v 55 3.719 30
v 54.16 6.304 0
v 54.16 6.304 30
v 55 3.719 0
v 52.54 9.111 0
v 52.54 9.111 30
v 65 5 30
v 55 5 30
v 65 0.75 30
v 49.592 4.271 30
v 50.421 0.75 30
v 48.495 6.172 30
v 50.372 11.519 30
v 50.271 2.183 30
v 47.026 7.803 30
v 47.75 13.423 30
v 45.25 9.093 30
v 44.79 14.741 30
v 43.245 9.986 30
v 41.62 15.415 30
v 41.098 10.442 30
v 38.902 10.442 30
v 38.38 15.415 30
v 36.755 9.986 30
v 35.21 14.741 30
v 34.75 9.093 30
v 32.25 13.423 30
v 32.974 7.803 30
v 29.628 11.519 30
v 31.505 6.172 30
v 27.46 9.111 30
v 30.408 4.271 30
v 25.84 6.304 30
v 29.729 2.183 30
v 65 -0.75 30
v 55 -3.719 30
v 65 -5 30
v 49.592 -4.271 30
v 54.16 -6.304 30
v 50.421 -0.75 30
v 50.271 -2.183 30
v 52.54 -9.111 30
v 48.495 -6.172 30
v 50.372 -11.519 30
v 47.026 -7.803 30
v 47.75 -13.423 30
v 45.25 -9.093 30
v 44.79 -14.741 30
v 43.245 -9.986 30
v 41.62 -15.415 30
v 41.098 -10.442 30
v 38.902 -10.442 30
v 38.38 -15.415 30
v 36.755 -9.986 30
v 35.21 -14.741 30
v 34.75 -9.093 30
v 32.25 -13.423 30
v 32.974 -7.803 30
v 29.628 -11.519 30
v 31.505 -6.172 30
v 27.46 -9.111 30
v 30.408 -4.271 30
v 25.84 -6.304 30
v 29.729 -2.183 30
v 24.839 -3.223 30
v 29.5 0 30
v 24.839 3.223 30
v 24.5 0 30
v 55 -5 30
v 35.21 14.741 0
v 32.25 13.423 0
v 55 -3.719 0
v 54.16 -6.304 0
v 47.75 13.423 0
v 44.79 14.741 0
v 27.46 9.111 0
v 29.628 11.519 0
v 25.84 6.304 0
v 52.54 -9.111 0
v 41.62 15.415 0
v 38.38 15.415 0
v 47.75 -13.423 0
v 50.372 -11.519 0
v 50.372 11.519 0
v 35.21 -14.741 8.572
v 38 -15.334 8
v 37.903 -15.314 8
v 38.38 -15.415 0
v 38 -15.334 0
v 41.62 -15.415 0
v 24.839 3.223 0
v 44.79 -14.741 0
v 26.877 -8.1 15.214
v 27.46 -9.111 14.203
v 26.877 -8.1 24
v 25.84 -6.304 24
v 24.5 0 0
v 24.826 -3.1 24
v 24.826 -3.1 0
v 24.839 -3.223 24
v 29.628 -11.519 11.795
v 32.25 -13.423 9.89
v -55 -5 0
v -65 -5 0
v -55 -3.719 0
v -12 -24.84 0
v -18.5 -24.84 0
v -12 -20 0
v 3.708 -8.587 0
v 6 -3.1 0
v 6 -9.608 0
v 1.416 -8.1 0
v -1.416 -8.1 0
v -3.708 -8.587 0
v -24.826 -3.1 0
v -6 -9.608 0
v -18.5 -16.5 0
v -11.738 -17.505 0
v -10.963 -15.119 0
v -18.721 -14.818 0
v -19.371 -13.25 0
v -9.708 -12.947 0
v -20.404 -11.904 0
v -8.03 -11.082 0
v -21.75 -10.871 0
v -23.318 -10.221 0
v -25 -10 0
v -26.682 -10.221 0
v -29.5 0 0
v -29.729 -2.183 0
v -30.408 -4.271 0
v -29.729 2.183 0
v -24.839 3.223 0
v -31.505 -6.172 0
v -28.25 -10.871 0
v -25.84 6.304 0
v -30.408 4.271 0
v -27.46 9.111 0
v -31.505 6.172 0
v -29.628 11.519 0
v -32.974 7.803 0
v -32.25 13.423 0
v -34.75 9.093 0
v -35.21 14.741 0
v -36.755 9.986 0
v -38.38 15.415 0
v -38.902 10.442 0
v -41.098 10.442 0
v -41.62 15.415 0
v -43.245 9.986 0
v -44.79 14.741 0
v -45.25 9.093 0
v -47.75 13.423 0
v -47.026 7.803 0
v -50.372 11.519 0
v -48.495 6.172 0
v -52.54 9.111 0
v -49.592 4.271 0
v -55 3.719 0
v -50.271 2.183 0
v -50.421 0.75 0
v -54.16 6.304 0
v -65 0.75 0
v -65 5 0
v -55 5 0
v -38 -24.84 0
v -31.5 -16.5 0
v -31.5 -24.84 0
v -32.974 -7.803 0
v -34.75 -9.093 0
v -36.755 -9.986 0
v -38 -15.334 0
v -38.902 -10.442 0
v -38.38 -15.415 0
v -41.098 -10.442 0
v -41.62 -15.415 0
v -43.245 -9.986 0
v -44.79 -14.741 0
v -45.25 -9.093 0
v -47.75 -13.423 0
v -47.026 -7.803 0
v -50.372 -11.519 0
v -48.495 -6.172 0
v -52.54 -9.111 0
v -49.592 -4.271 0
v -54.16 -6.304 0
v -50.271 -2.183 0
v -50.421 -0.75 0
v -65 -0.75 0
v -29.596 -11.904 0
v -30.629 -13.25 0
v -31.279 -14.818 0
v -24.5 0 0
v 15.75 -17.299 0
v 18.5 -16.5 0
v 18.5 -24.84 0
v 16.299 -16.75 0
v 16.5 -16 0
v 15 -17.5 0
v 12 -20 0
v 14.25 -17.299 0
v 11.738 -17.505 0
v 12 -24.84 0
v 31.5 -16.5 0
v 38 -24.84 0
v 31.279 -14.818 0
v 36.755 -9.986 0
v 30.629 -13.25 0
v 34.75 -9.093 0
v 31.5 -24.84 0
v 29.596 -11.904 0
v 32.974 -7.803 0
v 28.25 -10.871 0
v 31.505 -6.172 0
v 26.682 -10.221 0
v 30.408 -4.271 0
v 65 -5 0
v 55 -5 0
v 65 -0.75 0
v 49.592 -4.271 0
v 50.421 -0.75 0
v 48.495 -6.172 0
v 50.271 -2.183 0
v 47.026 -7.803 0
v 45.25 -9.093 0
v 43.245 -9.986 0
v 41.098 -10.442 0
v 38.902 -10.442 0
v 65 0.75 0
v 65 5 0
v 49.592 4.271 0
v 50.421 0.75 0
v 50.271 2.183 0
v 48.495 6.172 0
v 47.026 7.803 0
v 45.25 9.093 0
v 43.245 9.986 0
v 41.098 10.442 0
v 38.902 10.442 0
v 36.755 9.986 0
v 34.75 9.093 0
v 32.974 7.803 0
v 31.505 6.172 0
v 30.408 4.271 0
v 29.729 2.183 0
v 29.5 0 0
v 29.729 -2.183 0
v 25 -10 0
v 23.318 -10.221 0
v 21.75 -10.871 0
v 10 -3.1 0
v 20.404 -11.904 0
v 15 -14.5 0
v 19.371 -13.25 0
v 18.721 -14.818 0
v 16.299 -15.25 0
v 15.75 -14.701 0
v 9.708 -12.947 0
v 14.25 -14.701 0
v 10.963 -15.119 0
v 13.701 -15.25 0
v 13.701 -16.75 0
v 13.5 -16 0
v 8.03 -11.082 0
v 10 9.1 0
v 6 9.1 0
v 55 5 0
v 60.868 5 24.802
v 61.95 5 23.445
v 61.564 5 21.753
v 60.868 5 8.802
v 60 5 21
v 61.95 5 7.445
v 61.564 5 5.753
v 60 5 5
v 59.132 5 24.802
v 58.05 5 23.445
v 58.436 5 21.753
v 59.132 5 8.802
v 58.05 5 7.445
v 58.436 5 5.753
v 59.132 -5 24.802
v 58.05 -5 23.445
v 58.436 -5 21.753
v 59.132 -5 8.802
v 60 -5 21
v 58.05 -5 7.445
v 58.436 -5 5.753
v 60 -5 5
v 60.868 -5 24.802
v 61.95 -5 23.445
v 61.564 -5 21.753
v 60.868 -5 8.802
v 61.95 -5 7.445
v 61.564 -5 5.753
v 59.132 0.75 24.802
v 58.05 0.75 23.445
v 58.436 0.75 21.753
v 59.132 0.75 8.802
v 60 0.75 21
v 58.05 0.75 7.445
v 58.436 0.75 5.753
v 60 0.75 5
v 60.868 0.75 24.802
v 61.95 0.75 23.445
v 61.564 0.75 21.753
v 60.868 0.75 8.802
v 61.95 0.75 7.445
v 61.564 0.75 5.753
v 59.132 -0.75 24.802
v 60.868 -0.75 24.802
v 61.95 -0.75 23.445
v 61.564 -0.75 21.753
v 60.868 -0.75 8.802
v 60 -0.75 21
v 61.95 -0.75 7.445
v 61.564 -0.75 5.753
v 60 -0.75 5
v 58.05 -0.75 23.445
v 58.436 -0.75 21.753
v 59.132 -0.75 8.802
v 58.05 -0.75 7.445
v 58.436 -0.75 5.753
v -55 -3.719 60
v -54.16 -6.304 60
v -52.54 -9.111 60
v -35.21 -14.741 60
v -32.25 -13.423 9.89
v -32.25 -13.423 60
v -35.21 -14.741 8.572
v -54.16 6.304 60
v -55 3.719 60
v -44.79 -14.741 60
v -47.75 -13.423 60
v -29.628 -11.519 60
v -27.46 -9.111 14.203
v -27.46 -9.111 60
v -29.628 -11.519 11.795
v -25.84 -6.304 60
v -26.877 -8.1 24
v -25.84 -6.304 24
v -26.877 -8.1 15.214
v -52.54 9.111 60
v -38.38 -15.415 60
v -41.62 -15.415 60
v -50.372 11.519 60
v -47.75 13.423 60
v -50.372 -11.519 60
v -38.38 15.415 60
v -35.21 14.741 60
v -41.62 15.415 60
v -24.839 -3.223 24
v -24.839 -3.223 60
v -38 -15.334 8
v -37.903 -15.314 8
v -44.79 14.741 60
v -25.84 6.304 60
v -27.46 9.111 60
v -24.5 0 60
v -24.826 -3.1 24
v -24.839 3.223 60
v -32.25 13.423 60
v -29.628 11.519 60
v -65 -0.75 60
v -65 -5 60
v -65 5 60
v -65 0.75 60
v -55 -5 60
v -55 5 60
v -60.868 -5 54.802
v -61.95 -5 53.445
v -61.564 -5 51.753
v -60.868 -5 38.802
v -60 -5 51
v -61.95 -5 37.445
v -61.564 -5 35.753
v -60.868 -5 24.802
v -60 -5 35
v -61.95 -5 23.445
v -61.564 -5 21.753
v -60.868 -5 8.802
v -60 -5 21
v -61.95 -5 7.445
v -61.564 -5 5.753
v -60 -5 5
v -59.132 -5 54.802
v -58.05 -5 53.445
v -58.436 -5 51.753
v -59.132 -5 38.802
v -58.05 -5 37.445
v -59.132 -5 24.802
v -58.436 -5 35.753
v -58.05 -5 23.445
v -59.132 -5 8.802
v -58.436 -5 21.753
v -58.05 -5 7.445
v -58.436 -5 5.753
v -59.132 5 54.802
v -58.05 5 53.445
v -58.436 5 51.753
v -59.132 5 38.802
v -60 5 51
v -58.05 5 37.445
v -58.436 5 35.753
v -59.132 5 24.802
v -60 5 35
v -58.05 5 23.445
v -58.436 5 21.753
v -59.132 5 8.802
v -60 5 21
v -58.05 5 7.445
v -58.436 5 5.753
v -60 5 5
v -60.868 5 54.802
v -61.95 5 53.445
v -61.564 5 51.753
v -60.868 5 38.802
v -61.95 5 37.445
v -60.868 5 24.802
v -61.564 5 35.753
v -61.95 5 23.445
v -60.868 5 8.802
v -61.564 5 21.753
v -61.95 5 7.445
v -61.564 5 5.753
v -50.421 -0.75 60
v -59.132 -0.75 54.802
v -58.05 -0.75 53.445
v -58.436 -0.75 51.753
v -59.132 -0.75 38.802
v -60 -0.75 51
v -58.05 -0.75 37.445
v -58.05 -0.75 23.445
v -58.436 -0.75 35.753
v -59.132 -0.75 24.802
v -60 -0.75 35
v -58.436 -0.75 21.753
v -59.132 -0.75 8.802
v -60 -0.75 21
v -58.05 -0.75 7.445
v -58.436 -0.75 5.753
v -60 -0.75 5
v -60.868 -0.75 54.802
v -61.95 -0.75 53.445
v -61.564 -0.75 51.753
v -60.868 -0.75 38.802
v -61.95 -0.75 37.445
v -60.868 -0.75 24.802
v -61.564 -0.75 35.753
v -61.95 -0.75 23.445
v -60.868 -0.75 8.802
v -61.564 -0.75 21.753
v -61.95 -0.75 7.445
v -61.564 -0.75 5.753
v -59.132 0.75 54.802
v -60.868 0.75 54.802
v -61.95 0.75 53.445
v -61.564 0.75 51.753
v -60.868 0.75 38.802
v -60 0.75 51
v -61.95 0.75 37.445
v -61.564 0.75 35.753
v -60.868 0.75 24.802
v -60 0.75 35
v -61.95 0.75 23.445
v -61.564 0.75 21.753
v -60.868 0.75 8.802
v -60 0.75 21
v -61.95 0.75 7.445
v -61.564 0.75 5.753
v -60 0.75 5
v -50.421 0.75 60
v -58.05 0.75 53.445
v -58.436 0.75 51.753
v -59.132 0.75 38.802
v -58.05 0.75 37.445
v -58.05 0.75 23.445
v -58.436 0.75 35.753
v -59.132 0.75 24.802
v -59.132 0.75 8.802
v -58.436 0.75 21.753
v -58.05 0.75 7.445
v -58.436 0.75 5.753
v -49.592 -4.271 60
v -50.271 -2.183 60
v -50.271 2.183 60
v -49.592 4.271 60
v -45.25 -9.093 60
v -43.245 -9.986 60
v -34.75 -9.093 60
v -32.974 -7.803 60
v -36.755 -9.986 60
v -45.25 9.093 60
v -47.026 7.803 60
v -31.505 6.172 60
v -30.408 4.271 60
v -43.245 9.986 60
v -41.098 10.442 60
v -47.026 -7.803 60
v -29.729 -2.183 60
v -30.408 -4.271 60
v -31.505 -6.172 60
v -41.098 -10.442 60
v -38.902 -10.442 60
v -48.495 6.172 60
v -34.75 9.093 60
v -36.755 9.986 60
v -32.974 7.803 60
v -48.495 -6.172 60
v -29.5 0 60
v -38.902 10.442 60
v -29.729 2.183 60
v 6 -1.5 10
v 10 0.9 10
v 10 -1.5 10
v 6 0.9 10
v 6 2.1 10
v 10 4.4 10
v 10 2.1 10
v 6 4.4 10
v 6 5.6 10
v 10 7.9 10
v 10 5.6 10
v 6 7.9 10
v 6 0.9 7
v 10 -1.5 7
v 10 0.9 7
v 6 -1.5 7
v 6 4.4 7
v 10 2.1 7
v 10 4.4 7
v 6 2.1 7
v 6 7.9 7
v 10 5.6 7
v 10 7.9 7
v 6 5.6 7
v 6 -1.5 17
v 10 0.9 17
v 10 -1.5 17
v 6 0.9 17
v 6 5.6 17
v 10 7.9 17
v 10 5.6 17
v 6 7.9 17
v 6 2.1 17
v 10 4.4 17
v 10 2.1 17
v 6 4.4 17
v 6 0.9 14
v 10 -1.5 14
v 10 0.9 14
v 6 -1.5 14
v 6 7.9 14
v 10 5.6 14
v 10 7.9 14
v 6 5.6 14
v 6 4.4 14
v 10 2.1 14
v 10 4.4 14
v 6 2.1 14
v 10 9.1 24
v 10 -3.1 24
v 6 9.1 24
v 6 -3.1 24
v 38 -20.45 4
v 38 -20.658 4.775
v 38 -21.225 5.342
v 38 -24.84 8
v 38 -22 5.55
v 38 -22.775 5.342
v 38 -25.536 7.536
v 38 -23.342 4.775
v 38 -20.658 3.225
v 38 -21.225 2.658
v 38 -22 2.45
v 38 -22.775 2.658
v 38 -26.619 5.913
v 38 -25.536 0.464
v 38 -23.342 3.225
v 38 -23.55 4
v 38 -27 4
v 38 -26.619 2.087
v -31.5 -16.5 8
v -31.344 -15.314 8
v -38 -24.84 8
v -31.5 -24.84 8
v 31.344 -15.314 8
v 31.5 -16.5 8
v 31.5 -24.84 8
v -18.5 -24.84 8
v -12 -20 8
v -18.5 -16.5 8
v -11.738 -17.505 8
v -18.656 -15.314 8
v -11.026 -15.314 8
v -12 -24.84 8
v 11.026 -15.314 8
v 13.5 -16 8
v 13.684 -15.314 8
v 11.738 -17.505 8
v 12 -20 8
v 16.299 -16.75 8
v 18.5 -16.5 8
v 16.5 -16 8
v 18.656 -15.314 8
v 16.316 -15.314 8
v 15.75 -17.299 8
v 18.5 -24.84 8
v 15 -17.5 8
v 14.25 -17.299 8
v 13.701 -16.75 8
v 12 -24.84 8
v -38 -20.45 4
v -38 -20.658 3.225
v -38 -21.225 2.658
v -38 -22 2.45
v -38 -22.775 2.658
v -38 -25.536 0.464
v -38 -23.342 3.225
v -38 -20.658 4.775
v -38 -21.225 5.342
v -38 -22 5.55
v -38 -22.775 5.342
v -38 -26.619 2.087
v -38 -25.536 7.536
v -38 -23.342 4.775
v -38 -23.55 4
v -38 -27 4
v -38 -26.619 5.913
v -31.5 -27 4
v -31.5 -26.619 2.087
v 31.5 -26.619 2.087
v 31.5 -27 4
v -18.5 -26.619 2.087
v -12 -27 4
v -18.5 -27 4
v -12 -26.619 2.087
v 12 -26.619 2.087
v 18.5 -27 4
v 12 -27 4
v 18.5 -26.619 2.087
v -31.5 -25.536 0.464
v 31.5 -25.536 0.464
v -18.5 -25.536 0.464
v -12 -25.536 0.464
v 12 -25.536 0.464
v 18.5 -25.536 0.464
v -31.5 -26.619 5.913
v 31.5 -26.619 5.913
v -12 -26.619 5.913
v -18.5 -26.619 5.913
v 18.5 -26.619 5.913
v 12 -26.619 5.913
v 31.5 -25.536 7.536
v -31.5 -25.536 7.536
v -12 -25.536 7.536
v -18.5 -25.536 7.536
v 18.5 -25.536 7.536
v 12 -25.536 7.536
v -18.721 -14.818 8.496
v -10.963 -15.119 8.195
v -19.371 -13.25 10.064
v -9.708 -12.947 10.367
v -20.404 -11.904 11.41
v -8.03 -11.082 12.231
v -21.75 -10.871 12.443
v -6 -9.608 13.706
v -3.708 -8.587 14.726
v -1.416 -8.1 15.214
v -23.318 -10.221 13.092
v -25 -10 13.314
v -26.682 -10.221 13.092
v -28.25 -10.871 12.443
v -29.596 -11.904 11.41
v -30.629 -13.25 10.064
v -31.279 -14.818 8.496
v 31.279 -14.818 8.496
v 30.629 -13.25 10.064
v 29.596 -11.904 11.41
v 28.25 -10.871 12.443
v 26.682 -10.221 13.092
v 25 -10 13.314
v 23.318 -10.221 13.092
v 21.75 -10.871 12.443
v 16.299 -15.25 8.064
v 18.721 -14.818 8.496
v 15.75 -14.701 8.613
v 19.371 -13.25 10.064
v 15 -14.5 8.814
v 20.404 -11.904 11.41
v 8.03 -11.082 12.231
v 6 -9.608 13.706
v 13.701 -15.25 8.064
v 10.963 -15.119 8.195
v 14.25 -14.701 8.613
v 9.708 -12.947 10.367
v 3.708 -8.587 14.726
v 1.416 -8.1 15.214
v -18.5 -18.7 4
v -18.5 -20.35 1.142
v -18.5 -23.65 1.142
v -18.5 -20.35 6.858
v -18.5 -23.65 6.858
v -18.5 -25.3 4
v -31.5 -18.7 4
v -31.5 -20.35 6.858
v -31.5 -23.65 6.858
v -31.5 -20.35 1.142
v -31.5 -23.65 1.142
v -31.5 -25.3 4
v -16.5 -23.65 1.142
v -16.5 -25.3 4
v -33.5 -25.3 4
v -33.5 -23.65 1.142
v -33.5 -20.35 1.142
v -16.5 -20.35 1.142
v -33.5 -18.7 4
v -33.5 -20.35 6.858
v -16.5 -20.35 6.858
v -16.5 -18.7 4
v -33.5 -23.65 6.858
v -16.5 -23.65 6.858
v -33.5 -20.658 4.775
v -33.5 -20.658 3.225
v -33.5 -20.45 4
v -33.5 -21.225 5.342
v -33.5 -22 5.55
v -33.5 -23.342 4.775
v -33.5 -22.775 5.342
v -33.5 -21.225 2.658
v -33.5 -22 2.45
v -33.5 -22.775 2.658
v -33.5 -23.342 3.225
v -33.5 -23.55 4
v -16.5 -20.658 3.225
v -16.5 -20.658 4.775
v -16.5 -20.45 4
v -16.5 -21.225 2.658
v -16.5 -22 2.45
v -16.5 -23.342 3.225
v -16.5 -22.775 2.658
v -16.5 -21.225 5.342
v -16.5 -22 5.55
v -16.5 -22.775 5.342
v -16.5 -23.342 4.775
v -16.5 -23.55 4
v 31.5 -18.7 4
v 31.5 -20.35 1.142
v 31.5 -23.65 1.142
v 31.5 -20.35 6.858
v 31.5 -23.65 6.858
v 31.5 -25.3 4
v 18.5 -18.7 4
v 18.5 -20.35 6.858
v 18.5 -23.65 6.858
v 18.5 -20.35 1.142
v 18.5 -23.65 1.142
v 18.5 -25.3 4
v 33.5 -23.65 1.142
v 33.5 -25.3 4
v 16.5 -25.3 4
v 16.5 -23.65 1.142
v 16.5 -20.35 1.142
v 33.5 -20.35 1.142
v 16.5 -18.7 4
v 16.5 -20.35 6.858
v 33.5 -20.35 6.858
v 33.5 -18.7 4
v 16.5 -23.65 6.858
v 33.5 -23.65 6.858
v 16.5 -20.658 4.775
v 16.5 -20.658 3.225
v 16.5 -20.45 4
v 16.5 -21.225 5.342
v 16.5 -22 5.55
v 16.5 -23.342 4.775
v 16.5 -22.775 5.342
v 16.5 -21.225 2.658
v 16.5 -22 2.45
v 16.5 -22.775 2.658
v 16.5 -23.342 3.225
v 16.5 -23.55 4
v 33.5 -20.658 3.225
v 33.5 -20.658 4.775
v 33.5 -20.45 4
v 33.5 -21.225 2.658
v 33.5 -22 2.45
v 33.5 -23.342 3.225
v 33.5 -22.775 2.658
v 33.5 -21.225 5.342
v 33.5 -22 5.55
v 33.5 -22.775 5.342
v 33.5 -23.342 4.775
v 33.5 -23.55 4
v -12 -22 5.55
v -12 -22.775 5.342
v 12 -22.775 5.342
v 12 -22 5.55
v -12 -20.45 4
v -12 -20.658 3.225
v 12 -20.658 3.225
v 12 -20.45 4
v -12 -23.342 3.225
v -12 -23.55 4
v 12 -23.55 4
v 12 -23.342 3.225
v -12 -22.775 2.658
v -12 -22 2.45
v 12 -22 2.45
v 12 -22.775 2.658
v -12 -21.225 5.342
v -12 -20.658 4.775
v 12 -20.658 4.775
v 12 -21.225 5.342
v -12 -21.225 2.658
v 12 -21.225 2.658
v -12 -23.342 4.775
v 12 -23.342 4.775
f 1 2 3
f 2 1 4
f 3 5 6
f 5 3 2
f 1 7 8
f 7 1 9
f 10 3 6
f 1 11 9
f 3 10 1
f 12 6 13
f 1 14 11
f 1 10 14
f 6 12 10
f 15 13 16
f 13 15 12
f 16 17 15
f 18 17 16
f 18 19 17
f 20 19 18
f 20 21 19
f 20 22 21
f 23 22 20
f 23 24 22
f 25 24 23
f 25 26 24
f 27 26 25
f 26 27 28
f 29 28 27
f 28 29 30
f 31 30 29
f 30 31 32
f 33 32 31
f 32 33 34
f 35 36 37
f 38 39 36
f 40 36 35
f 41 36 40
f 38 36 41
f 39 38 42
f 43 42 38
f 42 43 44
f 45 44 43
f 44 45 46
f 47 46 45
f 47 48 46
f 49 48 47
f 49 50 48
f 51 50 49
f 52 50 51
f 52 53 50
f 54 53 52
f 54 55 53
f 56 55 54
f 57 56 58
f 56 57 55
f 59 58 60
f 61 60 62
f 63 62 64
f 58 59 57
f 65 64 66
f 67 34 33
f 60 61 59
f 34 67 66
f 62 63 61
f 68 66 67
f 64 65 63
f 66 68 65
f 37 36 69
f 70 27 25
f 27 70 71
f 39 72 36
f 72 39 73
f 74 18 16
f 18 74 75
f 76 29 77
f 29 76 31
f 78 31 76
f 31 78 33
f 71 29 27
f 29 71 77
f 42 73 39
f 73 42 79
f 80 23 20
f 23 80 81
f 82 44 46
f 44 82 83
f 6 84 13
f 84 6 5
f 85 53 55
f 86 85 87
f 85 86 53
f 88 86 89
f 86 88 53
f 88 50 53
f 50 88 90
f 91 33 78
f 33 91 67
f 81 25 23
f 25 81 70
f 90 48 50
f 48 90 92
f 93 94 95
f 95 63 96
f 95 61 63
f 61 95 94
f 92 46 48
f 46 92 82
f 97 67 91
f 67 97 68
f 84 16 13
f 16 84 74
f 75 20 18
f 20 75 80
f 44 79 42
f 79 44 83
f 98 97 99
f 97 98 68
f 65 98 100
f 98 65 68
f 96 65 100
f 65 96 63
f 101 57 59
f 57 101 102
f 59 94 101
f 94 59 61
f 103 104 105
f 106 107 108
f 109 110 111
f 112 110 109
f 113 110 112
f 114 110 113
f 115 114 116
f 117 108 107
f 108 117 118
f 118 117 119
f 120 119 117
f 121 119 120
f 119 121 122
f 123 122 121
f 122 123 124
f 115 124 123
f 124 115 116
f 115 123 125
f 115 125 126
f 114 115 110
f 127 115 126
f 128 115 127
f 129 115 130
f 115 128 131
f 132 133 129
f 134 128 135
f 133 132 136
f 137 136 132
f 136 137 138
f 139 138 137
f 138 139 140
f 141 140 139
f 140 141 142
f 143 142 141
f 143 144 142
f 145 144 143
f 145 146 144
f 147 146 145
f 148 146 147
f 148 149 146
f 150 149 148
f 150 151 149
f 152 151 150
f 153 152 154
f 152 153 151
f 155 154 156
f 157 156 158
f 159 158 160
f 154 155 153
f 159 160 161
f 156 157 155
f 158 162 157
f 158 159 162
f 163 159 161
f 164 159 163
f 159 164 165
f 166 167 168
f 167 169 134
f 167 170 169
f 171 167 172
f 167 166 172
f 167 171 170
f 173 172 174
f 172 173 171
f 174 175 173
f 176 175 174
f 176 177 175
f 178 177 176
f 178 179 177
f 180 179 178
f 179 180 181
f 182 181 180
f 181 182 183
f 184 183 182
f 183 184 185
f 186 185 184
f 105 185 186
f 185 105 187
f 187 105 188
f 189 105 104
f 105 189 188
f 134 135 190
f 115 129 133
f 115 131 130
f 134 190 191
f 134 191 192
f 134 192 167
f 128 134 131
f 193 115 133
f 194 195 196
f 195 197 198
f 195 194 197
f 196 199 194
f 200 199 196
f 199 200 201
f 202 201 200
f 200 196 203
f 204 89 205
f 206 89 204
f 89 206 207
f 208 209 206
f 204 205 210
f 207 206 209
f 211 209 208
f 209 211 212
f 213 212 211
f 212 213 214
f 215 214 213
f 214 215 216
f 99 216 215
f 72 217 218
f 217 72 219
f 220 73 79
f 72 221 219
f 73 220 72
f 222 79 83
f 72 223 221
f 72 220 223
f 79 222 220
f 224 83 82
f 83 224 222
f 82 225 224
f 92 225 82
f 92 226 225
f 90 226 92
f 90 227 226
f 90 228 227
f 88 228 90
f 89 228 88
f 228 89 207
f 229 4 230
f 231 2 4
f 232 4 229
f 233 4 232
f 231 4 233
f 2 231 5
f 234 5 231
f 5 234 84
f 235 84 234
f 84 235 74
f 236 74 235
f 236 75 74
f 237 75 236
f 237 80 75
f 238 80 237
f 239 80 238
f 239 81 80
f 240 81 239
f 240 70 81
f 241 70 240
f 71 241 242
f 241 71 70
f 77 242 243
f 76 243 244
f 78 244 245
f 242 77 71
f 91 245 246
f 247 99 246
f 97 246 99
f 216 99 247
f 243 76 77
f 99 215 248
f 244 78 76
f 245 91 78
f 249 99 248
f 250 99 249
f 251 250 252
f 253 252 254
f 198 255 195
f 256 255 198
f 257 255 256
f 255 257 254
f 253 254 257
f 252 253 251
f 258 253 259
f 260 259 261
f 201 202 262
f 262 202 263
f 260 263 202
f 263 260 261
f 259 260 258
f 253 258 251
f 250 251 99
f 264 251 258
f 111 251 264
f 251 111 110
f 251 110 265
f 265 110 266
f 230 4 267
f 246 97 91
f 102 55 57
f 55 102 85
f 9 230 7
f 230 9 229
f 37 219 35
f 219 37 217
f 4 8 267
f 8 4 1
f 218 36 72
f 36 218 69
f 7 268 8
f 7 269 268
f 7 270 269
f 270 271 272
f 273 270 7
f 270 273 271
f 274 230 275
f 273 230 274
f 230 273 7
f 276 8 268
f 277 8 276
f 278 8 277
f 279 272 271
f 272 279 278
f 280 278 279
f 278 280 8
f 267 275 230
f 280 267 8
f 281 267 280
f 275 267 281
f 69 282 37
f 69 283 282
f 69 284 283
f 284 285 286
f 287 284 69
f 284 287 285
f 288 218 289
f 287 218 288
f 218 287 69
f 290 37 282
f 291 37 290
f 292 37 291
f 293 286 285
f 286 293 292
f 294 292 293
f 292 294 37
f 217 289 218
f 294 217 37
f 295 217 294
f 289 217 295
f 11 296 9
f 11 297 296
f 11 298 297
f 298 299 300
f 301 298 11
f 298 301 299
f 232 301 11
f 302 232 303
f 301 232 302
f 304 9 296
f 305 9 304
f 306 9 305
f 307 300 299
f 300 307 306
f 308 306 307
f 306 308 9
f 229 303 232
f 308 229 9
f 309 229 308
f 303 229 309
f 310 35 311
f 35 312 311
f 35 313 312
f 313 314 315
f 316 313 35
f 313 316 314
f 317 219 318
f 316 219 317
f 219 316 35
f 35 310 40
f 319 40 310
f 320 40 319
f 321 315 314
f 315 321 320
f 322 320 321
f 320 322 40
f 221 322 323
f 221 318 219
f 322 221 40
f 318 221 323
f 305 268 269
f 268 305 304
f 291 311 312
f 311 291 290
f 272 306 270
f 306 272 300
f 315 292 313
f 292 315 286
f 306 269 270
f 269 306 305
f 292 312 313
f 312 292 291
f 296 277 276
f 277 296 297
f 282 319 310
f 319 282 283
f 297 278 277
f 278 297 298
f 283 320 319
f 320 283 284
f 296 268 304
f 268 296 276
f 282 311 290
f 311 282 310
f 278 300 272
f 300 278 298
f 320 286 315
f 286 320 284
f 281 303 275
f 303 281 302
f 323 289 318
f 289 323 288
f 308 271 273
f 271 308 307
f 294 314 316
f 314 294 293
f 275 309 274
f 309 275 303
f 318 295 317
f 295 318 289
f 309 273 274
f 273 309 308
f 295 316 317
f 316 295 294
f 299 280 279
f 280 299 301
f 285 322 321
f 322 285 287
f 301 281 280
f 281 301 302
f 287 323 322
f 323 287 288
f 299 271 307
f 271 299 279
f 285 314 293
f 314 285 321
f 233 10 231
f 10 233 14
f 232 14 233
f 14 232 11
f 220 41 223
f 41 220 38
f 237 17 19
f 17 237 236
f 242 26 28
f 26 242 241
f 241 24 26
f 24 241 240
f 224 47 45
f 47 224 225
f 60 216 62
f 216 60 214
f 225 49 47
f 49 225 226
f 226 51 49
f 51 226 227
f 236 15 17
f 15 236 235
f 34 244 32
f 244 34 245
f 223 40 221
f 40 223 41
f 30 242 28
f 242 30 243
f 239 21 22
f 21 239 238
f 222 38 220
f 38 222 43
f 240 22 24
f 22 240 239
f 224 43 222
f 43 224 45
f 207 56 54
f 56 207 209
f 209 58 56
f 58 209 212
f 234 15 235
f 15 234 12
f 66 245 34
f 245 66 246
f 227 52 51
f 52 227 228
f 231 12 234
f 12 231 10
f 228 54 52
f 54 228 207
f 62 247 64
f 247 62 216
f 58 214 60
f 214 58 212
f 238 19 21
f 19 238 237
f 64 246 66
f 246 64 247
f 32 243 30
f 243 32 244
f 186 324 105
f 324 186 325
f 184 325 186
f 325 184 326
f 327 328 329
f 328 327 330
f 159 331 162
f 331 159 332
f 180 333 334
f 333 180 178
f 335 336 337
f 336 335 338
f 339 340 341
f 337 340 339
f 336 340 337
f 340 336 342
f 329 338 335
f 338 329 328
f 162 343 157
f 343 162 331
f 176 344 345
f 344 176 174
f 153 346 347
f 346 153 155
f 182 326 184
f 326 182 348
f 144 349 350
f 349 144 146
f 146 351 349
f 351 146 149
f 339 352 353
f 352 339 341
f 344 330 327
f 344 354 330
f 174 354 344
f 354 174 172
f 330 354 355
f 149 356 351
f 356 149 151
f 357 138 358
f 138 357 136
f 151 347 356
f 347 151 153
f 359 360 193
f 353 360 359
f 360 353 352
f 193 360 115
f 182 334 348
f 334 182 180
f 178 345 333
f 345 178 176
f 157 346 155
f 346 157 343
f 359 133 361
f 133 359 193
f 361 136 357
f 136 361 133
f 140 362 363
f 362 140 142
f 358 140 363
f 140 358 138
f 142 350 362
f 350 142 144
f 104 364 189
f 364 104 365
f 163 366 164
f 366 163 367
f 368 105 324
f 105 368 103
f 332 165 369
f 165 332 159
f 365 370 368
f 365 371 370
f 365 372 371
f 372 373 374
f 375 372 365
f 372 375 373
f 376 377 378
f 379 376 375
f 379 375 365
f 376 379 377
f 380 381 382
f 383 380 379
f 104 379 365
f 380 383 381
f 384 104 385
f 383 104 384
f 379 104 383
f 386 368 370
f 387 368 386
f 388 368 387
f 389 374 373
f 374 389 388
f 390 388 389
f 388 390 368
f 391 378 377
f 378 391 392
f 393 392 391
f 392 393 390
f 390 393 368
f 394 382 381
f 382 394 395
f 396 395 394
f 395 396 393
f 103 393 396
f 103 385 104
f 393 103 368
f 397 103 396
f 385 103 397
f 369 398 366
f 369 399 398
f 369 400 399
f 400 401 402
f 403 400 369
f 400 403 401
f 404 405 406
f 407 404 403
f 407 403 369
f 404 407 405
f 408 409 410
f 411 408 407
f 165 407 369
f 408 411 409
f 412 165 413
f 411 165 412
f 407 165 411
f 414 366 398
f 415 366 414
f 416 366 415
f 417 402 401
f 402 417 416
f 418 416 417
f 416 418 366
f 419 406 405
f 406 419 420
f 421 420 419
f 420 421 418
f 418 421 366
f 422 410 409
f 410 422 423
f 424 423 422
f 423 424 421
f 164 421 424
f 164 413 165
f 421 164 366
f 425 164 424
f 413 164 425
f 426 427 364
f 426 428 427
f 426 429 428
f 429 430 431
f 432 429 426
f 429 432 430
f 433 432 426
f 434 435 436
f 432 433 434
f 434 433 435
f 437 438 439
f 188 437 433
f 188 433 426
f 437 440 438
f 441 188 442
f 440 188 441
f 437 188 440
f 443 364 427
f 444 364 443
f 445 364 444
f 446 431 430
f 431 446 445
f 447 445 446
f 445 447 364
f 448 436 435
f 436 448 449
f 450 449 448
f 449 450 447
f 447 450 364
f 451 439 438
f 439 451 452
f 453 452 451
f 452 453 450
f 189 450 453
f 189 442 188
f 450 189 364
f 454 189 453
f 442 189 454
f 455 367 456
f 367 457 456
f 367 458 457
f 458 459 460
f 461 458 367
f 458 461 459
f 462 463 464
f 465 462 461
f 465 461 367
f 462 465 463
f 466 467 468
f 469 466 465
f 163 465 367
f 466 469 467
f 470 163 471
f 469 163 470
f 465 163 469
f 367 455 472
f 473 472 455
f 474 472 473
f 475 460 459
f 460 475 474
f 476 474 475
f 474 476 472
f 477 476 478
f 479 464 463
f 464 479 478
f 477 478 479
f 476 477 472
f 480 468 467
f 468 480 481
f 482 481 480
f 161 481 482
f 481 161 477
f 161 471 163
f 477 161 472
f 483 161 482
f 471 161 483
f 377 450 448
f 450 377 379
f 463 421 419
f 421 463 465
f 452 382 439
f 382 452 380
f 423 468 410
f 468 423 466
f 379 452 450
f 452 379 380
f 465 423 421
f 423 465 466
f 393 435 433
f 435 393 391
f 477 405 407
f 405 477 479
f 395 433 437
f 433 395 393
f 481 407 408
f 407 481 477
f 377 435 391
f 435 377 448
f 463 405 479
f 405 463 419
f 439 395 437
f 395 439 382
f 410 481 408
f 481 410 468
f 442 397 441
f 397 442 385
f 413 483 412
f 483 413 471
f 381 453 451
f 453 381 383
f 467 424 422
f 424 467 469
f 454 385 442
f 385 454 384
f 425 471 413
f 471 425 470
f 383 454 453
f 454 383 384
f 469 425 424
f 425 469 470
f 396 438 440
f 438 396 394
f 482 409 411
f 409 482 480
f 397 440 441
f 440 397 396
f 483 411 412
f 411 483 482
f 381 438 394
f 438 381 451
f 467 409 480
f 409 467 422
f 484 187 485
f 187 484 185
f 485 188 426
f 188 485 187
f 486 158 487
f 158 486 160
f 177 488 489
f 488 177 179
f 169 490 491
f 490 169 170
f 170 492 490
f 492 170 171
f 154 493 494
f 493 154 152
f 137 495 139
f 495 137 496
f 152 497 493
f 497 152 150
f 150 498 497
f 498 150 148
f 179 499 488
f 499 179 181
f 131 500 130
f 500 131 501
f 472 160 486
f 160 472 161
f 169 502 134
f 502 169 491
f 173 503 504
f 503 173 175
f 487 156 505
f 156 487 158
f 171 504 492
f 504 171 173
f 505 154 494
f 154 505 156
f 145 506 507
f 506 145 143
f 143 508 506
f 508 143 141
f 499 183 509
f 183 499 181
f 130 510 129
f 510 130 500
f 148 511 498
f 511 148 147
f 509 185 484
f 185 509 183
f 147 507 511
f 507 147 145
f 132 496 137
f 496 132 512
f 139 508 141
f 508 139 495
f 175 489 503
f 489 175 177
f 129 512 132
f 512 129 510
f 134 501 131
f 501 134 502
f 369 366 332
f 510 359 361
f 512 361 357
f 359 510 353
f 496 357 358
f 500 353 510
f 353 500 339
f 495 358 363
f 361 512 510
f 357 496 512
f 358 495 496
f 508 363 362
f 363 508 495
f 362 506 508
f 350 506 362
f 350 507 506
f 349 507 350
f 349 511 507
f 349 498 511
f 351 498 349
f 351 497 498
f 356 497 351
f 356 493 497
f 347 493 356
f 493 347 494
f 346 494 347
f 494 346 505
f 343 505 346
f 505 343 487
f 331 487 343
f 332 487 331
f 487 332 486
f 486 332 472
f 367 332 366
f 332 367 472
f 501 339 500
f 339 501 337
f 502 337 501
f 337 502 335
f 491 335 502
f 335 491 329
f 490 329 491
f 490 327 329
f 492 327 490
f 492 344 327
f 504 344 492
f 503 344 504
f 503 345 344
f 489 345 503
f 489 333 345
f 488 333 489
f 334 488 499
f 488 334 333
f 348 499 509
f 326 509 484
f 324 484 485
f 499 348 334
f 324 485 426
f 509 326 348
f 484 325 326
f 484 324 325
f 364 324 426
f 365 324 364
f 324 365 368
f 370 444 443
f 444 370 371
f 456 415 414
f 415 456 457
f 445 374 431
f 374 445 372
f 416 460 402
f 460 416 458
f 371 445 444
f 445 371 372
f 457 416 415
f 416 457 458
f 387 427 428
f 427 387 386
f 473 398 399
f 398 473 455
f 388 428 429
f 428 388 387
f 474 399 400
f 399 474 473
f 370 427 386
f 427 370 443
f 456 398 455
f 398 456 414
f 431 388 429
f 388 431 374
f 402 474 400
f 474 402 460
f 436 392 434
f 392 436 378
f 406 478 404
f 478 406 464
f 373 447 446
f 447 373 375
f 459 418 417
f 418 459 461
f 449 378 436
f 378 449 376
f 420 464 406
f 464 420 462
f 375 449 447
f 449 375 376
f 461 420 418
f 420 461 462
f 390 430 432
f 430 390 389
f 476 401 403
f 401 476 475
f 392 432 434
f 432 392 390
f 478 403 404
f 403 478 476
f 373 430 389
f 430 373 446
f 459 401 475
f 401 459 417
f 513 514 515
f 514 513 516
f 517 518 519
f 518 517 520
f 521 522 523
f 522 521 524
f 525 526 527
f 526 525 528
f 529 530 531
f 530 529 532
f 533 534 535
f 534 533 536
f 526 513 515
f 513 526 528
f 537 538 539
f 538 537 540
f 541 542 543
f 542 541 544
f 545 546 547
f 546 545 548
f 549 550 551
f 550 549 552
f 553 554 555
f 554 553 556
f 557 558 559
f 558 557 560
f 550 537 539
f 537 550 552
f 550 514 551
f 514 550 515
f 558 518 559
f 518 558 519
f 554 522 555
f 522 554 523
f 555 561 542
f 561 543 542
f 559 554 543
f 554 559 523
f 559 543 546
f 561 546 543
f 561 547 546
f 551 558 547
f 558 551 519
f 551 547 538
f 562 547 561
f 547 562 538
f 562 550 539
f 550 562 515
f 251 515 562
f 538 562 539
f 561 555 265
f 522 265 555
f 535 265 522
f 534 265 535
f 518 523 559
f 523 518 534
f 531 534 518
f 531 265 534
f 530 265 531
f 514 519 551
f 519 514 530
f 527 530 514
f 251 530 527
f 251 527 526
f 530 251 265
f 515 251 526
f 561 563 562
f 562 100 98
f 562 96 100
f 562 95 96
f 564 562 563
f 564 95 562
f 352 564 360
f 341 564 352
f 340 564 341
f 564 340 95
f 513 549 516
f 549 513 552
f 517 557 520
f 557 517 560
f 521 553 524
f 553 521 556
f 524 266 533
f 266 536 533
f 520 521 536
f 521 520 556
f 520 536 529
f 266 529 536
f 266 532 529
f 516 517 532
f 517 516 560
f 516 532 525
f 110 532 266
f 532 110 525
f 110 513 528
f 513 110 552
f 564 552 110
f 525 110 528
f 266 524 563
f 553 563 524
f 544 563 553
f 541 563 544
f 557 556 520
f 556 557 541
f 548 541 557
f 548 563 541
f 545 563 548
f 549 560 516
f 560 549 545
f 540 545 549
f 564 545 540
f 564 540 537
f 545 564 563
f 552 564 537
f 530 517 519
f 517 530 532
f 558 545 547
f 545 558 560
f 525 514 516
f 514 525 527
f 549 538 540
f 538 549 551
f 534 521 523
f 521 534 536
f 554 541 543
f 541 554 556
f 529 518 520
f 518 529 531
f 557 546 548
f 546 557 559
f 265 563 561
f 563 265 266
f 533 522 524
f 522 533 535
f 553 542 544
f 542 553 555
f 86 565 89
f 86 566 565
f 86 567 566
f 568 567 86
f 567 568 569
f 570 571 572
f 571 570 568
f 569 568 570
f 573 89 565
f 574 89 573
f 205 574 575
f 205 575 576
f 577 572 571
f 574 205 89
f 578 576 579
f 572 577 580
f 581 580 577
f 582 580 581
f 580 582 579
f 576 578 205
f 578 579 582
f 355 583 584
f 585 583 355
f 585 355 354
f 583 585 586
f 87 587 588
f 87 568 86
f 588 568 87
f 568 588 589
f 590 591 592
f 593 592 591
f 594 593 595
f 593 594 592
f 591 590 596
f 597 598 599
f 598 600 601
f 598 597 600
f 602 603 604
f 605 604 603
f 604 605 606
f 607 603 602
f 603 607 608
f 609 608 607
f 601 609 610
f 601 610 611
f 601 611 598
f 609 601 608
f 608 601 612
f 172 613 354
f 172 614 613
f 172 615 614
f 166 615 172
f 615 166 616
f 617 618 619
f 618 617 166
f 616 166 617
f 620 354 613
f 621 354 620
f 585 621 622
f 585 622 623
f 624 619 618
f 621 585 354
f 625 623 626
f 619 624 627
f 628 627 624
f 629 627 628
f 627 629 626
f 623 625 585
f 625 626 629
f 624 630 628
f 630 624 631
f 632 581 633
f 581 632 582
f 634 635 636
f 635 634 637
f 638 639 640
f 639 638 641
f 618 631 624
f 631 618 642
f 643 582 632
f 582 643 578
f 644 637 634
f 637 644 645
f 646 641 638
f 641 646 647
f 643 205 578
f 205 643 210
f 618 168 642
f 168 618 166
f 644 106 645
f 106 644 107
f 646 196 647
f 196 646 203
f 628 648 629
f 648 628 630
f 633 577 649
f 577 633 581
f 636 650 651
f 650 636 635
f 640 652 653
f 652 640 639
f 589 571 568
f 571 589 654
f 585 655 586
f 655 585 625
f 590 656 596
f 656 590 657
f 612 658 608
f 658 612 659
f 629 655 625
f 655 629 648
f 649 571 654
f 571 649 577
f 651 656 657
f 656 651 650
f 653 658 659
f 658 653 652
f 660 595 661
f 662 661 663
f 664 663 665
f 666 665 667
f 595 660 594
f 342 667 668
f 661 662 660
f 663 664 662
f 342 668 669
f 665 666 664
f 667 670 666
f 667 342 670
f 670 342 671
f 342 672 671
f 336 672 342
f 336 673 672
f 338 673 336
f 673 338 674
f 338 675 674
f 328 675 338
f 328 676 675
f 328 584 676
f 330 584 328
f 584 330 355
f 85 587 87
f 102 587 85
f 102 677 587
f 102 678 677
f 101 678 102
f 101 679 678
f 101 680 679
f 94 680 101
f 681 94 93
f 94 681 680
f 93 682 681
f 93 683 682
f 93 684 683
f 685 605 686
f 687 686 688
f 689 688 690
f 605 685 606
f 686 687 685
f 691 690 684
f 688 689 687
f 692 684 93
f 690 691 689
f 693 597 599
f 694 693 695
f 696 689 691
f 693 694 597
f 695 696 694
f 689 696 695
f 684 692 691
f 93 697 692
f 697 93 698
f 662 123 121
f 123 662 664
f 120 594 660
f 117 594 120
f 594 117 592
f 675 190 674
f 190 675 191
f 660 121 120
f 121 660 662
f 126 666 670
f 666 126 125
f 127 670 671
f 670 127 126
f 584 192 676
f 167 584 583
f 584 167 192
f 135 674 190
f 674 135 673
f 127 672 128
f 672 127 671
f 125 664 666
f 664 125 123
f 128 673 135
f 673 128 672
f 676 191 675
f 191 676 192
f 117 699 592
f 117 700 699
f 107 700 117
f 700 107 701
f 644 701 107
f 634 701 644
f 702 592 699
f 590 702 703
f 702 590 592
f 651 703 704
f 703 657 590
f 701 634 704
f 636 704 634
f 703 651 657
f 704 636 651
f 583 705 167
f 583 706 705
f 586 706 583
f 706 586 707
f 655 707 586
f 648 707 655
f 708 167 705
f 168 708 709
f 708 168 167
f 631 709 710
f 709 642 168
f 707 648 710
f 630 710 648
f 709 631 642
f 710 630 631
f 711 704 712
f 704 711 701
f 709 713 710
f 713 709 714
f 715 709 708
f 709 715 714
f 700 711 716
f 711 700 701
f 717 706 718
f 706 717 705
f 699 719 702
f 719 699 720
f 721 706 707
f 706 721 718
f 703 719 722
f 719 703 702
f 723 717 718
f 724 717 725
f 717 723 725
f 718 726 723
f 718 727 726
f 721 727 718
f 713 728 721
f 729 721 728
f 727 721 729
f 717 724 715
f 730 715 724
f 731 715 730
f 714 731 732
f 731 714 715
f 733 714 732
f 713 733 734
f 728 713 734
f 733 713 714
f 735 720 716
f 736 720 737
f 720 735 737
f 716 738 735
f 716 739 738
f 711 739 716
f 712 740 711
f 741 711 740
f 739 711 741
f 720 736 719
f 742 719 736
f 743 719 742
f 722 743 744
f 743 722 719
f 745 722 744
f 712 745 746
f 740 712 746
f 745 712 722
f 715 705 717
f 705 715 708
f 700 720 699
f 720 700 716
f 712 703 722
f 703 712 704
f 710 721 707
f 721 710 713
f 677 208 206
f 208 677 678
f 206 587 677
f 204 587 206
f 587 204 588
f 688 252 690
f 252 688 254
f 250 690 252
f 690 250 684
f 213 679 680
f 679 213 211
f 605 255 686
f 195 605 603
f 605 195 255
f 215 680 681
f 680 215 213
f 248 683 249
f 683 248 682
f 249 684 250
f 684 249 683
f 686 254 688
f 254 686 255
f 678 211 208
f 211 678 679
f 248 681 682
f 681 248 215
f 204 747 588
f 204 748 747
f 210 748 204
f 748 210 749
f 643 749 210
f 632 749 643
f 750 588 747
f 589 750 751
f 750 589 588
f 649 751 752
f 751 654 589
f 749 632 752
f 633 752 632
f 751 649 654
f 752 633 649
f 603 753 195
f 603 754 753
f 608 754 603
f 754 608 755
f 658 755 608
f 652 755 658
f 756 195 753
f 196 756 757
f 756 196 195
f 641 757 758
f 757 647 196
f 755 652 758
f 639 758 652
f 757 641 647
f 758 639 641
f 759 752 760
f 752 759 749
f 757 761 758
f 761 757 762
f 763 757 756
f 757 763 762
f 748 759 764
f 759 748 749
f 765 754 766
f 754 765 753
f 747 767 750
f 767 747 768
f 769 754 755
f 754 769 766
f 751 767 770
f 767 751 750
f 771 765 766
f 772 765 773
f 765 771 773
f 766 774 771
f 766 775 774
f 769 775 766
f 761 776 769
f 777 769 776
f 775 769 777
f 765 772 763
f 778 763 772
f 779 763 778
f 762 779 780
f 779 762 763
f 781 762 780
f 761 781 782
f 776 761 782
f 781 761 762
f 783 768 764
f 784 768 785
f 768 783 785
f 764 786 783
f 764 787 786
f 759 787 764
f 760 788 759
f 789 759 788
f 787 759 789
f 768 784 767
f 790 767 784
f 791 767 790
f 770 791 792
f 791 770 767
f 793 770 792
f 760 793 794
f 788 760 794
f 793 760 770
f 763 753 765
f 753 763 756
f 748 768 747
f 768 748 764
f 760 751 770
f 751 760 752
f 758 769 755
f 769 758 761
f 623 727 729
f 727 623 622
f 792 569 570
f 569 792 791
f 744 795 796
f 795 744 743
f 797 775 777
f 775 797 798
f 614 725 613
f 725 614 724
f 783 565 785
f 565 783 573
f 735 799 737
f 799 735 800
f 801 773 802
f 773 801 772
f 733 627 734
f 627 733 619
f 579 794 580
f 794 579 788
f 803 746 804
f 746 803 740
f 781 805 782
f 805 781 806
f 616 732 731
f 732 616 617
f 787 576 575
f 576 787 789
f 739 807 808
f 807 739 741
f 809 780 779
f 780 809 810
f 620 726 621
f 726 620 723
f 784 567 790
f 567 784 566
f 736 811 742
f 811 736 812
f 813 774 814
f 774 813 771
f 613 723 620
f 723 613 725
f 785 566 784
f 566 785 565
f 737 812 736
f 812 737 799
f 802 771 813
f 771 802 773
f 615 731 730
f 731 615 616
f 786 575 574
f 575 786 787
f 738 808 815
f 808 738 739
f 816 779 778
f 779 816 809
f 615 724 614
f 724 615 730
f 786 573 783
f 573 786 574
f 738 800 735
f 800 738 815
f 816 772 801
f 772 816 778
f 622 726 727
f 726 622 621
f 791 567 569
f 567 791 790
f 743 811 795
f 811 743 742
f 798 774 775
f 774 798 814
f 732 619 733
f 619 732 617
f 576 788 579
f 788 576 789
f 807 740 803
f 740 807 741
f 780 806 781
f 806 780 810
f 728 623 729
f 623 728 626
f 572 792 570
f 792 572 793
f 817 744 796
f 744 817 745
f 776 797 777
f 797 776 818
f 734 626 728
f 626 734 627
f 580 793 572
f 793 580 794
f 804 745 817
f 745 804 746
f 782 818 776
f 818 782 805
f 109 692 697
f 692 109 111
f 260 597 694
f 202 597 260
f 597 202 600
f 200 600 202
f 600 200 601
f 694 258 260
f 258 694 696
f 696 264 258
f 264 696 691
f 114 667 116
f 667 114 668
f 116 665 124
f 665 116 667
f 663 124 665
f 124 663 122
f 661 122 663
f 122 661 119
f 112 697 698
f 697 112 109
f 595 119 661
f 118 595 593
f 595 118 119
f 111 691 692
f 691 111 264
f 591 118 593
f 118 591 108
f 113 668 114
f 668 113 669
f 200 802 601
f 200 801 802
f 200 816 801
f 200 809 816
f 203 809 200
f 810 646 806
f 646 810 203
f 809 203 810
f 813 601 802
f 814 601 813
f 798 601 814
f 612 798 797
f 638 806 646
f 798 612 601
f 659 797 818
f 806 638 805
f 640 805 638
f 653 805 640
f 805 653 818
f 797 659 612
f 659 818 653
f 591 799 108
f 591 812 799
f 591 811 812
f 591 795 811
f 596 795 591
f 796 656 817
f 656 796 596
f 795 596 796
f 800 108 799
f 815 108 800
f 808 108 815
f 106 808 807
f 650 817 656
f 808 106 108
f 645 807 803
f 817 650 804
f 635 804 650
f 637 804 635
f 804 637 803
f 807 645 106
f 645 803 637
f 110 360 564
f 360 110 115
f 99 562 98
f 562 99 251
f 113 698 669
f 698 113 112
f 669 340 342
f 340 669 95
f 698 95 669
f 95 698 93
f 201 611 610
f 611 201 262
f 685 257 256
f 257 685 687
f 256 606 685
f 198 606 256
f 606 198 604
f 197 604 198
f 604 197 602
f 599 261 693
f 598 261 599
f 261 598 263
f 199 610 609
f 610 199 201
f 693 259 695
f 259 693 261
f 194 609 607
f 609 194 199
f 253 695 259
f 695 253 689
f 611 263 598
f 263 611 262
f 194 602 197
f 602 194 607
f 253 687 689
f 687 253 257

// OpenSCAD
// file: configuration.scad
motor_end_height=50;
idler_end_height=28;
carriage_height=24;
platform_thickness=8;
bed_thickness=12;
pcb_thickness=2;
rod_length=200;
smooth_rod_length=1000;
smooth_rod_diameter=12;
smooth_rod_distance=80;
sandwich_smooth_rod_mounting_screw_distance=12;
tower_radius = 200;
platform_hinge_offset=33;
carriage_hinge_offset=22;
plywood_thickness=9;
// main file
include <configuration.scad>

width = 76;
height = carriage_height;

offset = 25;
cutout = 13;
middle = 2*offset - width/2;

module parallel_joints(reinforced) {
  difference() {
    union() {
      intersection() {
        cube([width, 20, 8], center=true);
        rotate([0, 90, 0]) cylinder(r=5, h=width, center=true);
      }
      intersection() {
        translate([0, 18, 4]) rotate([45, 0, 0])
          cube([width, reinforced, reinforced], center=true);
        translate([0, 0, 20]) cube([width, 35, 40], center=true);
      }
      translate([0, 8, 0]) cube([width, 16, 8], center=true);
    }
    rotate([0, 90, 0]) cylinder(r=1.55, h=80, center=true, $fn=12);

    for (x = [-offset, offset]) {
      translate([x, 5.5, 0])
        cylinder(r=cutout/2, h=100, center=true, $fn=24);
      translate([x, -4.5, 0])
        cube([cutout, 20, 100], center=true);
      translate([x, 0, 0]) rotate([0, 90, 0]) rotate([0, 0, 30])
        cylinder(r=3.3, h=17, center=true, $fn=6);
    }
    translate([0, 2, 0]) cylinder(r=middle, h=100, center=true);
    translate([0, -8, 0]) cube([2*middle, 20, 100], center=true);
  }
}

module lm8uu_mount(d, h) {
  union() {
    difference() {
      union() {
        cylinder(r=d/2+5, h=h, center=true);
        translate([20, 0, 0]) cube([10, 10, h], center=true);
      }
		translate([18,0,0])cube([22,1.5,h+2],center=true);
		translate([20,0,8])rotate([90,90,0])cylinder(r=2,h=40,center=true);
		translate([20,0,-8])rotate([90,90,0])cylinder(r=2,h=40,center=true);
      cylinder(r=d/2, h=h+1, center=true);
    }
  }
}

module belt_mount() {
  difference() {
    union() {
      difference() {
        translate([8, 2, 0]) cube([4, 13, height], center=true);
        for (z = [-3.5, 3.5])
          translate([8, 5, z])
            cube([5, 13, 3], center=true);
      }
      for (y = [1.5, 5, 8.5]) {
        translate([8, y, 0]) cube([4, 1.2, height], center=true);
      }
    }
  }
}

module carriage() {
  translate([0, 0, height/2]) 
  union() {
	 translate([smooth_rod_distance/2, 0, 3]) lm8uu_mount(d=21, h=30);
	 translate([-smooth_rod_distance/2, 0, 3])rotate([0,0,180])lm8uu_mount(d=21, h=30);
    translate([-smooth_rod_distance/2, 0, 30+3])rotate([0,0,180])lm8uu_mount(d=21, h=30);
    belt_mount();
    difference() {
      union() {
        translate([0, -5.6, 0])
          cube([80, 5, height], center=true);
        translate([0, -carriage_hinge_offset, -height/2+4])
          parallel_joints(16);
      }
      // Screw hole for adjustable top endstop.
      translate([15, -16, -height/2+4])
        cylinder(r=1.5, h=20, center=true, $fn=12);
      for (x = [-smooth_rod_distance/2, smooth_rod_distance/2]) {
        translate([x, 0, 0])
          cylinder(r=21/2, h=height+1, center=true);
        // Zip tie tunnels.
        for (z = [-height/2+4, height/2-4])
          translate([x, 0, z])
            cylinder(r=13, h=3, center=true);
      }
    }
  }
}

carriage();
%for (x = [-smooth_rod_distance/2, smooth_rod_distance/2])
      translate([x, 0, 3]) cylinder(r=21/2,h=150,center=true);


// Uncomment the following lines to check endstop alignment.
// use <idler_end.scad>;
// translate([0, 0, -20]) rotate([180, 0, 0]) idler_end();
